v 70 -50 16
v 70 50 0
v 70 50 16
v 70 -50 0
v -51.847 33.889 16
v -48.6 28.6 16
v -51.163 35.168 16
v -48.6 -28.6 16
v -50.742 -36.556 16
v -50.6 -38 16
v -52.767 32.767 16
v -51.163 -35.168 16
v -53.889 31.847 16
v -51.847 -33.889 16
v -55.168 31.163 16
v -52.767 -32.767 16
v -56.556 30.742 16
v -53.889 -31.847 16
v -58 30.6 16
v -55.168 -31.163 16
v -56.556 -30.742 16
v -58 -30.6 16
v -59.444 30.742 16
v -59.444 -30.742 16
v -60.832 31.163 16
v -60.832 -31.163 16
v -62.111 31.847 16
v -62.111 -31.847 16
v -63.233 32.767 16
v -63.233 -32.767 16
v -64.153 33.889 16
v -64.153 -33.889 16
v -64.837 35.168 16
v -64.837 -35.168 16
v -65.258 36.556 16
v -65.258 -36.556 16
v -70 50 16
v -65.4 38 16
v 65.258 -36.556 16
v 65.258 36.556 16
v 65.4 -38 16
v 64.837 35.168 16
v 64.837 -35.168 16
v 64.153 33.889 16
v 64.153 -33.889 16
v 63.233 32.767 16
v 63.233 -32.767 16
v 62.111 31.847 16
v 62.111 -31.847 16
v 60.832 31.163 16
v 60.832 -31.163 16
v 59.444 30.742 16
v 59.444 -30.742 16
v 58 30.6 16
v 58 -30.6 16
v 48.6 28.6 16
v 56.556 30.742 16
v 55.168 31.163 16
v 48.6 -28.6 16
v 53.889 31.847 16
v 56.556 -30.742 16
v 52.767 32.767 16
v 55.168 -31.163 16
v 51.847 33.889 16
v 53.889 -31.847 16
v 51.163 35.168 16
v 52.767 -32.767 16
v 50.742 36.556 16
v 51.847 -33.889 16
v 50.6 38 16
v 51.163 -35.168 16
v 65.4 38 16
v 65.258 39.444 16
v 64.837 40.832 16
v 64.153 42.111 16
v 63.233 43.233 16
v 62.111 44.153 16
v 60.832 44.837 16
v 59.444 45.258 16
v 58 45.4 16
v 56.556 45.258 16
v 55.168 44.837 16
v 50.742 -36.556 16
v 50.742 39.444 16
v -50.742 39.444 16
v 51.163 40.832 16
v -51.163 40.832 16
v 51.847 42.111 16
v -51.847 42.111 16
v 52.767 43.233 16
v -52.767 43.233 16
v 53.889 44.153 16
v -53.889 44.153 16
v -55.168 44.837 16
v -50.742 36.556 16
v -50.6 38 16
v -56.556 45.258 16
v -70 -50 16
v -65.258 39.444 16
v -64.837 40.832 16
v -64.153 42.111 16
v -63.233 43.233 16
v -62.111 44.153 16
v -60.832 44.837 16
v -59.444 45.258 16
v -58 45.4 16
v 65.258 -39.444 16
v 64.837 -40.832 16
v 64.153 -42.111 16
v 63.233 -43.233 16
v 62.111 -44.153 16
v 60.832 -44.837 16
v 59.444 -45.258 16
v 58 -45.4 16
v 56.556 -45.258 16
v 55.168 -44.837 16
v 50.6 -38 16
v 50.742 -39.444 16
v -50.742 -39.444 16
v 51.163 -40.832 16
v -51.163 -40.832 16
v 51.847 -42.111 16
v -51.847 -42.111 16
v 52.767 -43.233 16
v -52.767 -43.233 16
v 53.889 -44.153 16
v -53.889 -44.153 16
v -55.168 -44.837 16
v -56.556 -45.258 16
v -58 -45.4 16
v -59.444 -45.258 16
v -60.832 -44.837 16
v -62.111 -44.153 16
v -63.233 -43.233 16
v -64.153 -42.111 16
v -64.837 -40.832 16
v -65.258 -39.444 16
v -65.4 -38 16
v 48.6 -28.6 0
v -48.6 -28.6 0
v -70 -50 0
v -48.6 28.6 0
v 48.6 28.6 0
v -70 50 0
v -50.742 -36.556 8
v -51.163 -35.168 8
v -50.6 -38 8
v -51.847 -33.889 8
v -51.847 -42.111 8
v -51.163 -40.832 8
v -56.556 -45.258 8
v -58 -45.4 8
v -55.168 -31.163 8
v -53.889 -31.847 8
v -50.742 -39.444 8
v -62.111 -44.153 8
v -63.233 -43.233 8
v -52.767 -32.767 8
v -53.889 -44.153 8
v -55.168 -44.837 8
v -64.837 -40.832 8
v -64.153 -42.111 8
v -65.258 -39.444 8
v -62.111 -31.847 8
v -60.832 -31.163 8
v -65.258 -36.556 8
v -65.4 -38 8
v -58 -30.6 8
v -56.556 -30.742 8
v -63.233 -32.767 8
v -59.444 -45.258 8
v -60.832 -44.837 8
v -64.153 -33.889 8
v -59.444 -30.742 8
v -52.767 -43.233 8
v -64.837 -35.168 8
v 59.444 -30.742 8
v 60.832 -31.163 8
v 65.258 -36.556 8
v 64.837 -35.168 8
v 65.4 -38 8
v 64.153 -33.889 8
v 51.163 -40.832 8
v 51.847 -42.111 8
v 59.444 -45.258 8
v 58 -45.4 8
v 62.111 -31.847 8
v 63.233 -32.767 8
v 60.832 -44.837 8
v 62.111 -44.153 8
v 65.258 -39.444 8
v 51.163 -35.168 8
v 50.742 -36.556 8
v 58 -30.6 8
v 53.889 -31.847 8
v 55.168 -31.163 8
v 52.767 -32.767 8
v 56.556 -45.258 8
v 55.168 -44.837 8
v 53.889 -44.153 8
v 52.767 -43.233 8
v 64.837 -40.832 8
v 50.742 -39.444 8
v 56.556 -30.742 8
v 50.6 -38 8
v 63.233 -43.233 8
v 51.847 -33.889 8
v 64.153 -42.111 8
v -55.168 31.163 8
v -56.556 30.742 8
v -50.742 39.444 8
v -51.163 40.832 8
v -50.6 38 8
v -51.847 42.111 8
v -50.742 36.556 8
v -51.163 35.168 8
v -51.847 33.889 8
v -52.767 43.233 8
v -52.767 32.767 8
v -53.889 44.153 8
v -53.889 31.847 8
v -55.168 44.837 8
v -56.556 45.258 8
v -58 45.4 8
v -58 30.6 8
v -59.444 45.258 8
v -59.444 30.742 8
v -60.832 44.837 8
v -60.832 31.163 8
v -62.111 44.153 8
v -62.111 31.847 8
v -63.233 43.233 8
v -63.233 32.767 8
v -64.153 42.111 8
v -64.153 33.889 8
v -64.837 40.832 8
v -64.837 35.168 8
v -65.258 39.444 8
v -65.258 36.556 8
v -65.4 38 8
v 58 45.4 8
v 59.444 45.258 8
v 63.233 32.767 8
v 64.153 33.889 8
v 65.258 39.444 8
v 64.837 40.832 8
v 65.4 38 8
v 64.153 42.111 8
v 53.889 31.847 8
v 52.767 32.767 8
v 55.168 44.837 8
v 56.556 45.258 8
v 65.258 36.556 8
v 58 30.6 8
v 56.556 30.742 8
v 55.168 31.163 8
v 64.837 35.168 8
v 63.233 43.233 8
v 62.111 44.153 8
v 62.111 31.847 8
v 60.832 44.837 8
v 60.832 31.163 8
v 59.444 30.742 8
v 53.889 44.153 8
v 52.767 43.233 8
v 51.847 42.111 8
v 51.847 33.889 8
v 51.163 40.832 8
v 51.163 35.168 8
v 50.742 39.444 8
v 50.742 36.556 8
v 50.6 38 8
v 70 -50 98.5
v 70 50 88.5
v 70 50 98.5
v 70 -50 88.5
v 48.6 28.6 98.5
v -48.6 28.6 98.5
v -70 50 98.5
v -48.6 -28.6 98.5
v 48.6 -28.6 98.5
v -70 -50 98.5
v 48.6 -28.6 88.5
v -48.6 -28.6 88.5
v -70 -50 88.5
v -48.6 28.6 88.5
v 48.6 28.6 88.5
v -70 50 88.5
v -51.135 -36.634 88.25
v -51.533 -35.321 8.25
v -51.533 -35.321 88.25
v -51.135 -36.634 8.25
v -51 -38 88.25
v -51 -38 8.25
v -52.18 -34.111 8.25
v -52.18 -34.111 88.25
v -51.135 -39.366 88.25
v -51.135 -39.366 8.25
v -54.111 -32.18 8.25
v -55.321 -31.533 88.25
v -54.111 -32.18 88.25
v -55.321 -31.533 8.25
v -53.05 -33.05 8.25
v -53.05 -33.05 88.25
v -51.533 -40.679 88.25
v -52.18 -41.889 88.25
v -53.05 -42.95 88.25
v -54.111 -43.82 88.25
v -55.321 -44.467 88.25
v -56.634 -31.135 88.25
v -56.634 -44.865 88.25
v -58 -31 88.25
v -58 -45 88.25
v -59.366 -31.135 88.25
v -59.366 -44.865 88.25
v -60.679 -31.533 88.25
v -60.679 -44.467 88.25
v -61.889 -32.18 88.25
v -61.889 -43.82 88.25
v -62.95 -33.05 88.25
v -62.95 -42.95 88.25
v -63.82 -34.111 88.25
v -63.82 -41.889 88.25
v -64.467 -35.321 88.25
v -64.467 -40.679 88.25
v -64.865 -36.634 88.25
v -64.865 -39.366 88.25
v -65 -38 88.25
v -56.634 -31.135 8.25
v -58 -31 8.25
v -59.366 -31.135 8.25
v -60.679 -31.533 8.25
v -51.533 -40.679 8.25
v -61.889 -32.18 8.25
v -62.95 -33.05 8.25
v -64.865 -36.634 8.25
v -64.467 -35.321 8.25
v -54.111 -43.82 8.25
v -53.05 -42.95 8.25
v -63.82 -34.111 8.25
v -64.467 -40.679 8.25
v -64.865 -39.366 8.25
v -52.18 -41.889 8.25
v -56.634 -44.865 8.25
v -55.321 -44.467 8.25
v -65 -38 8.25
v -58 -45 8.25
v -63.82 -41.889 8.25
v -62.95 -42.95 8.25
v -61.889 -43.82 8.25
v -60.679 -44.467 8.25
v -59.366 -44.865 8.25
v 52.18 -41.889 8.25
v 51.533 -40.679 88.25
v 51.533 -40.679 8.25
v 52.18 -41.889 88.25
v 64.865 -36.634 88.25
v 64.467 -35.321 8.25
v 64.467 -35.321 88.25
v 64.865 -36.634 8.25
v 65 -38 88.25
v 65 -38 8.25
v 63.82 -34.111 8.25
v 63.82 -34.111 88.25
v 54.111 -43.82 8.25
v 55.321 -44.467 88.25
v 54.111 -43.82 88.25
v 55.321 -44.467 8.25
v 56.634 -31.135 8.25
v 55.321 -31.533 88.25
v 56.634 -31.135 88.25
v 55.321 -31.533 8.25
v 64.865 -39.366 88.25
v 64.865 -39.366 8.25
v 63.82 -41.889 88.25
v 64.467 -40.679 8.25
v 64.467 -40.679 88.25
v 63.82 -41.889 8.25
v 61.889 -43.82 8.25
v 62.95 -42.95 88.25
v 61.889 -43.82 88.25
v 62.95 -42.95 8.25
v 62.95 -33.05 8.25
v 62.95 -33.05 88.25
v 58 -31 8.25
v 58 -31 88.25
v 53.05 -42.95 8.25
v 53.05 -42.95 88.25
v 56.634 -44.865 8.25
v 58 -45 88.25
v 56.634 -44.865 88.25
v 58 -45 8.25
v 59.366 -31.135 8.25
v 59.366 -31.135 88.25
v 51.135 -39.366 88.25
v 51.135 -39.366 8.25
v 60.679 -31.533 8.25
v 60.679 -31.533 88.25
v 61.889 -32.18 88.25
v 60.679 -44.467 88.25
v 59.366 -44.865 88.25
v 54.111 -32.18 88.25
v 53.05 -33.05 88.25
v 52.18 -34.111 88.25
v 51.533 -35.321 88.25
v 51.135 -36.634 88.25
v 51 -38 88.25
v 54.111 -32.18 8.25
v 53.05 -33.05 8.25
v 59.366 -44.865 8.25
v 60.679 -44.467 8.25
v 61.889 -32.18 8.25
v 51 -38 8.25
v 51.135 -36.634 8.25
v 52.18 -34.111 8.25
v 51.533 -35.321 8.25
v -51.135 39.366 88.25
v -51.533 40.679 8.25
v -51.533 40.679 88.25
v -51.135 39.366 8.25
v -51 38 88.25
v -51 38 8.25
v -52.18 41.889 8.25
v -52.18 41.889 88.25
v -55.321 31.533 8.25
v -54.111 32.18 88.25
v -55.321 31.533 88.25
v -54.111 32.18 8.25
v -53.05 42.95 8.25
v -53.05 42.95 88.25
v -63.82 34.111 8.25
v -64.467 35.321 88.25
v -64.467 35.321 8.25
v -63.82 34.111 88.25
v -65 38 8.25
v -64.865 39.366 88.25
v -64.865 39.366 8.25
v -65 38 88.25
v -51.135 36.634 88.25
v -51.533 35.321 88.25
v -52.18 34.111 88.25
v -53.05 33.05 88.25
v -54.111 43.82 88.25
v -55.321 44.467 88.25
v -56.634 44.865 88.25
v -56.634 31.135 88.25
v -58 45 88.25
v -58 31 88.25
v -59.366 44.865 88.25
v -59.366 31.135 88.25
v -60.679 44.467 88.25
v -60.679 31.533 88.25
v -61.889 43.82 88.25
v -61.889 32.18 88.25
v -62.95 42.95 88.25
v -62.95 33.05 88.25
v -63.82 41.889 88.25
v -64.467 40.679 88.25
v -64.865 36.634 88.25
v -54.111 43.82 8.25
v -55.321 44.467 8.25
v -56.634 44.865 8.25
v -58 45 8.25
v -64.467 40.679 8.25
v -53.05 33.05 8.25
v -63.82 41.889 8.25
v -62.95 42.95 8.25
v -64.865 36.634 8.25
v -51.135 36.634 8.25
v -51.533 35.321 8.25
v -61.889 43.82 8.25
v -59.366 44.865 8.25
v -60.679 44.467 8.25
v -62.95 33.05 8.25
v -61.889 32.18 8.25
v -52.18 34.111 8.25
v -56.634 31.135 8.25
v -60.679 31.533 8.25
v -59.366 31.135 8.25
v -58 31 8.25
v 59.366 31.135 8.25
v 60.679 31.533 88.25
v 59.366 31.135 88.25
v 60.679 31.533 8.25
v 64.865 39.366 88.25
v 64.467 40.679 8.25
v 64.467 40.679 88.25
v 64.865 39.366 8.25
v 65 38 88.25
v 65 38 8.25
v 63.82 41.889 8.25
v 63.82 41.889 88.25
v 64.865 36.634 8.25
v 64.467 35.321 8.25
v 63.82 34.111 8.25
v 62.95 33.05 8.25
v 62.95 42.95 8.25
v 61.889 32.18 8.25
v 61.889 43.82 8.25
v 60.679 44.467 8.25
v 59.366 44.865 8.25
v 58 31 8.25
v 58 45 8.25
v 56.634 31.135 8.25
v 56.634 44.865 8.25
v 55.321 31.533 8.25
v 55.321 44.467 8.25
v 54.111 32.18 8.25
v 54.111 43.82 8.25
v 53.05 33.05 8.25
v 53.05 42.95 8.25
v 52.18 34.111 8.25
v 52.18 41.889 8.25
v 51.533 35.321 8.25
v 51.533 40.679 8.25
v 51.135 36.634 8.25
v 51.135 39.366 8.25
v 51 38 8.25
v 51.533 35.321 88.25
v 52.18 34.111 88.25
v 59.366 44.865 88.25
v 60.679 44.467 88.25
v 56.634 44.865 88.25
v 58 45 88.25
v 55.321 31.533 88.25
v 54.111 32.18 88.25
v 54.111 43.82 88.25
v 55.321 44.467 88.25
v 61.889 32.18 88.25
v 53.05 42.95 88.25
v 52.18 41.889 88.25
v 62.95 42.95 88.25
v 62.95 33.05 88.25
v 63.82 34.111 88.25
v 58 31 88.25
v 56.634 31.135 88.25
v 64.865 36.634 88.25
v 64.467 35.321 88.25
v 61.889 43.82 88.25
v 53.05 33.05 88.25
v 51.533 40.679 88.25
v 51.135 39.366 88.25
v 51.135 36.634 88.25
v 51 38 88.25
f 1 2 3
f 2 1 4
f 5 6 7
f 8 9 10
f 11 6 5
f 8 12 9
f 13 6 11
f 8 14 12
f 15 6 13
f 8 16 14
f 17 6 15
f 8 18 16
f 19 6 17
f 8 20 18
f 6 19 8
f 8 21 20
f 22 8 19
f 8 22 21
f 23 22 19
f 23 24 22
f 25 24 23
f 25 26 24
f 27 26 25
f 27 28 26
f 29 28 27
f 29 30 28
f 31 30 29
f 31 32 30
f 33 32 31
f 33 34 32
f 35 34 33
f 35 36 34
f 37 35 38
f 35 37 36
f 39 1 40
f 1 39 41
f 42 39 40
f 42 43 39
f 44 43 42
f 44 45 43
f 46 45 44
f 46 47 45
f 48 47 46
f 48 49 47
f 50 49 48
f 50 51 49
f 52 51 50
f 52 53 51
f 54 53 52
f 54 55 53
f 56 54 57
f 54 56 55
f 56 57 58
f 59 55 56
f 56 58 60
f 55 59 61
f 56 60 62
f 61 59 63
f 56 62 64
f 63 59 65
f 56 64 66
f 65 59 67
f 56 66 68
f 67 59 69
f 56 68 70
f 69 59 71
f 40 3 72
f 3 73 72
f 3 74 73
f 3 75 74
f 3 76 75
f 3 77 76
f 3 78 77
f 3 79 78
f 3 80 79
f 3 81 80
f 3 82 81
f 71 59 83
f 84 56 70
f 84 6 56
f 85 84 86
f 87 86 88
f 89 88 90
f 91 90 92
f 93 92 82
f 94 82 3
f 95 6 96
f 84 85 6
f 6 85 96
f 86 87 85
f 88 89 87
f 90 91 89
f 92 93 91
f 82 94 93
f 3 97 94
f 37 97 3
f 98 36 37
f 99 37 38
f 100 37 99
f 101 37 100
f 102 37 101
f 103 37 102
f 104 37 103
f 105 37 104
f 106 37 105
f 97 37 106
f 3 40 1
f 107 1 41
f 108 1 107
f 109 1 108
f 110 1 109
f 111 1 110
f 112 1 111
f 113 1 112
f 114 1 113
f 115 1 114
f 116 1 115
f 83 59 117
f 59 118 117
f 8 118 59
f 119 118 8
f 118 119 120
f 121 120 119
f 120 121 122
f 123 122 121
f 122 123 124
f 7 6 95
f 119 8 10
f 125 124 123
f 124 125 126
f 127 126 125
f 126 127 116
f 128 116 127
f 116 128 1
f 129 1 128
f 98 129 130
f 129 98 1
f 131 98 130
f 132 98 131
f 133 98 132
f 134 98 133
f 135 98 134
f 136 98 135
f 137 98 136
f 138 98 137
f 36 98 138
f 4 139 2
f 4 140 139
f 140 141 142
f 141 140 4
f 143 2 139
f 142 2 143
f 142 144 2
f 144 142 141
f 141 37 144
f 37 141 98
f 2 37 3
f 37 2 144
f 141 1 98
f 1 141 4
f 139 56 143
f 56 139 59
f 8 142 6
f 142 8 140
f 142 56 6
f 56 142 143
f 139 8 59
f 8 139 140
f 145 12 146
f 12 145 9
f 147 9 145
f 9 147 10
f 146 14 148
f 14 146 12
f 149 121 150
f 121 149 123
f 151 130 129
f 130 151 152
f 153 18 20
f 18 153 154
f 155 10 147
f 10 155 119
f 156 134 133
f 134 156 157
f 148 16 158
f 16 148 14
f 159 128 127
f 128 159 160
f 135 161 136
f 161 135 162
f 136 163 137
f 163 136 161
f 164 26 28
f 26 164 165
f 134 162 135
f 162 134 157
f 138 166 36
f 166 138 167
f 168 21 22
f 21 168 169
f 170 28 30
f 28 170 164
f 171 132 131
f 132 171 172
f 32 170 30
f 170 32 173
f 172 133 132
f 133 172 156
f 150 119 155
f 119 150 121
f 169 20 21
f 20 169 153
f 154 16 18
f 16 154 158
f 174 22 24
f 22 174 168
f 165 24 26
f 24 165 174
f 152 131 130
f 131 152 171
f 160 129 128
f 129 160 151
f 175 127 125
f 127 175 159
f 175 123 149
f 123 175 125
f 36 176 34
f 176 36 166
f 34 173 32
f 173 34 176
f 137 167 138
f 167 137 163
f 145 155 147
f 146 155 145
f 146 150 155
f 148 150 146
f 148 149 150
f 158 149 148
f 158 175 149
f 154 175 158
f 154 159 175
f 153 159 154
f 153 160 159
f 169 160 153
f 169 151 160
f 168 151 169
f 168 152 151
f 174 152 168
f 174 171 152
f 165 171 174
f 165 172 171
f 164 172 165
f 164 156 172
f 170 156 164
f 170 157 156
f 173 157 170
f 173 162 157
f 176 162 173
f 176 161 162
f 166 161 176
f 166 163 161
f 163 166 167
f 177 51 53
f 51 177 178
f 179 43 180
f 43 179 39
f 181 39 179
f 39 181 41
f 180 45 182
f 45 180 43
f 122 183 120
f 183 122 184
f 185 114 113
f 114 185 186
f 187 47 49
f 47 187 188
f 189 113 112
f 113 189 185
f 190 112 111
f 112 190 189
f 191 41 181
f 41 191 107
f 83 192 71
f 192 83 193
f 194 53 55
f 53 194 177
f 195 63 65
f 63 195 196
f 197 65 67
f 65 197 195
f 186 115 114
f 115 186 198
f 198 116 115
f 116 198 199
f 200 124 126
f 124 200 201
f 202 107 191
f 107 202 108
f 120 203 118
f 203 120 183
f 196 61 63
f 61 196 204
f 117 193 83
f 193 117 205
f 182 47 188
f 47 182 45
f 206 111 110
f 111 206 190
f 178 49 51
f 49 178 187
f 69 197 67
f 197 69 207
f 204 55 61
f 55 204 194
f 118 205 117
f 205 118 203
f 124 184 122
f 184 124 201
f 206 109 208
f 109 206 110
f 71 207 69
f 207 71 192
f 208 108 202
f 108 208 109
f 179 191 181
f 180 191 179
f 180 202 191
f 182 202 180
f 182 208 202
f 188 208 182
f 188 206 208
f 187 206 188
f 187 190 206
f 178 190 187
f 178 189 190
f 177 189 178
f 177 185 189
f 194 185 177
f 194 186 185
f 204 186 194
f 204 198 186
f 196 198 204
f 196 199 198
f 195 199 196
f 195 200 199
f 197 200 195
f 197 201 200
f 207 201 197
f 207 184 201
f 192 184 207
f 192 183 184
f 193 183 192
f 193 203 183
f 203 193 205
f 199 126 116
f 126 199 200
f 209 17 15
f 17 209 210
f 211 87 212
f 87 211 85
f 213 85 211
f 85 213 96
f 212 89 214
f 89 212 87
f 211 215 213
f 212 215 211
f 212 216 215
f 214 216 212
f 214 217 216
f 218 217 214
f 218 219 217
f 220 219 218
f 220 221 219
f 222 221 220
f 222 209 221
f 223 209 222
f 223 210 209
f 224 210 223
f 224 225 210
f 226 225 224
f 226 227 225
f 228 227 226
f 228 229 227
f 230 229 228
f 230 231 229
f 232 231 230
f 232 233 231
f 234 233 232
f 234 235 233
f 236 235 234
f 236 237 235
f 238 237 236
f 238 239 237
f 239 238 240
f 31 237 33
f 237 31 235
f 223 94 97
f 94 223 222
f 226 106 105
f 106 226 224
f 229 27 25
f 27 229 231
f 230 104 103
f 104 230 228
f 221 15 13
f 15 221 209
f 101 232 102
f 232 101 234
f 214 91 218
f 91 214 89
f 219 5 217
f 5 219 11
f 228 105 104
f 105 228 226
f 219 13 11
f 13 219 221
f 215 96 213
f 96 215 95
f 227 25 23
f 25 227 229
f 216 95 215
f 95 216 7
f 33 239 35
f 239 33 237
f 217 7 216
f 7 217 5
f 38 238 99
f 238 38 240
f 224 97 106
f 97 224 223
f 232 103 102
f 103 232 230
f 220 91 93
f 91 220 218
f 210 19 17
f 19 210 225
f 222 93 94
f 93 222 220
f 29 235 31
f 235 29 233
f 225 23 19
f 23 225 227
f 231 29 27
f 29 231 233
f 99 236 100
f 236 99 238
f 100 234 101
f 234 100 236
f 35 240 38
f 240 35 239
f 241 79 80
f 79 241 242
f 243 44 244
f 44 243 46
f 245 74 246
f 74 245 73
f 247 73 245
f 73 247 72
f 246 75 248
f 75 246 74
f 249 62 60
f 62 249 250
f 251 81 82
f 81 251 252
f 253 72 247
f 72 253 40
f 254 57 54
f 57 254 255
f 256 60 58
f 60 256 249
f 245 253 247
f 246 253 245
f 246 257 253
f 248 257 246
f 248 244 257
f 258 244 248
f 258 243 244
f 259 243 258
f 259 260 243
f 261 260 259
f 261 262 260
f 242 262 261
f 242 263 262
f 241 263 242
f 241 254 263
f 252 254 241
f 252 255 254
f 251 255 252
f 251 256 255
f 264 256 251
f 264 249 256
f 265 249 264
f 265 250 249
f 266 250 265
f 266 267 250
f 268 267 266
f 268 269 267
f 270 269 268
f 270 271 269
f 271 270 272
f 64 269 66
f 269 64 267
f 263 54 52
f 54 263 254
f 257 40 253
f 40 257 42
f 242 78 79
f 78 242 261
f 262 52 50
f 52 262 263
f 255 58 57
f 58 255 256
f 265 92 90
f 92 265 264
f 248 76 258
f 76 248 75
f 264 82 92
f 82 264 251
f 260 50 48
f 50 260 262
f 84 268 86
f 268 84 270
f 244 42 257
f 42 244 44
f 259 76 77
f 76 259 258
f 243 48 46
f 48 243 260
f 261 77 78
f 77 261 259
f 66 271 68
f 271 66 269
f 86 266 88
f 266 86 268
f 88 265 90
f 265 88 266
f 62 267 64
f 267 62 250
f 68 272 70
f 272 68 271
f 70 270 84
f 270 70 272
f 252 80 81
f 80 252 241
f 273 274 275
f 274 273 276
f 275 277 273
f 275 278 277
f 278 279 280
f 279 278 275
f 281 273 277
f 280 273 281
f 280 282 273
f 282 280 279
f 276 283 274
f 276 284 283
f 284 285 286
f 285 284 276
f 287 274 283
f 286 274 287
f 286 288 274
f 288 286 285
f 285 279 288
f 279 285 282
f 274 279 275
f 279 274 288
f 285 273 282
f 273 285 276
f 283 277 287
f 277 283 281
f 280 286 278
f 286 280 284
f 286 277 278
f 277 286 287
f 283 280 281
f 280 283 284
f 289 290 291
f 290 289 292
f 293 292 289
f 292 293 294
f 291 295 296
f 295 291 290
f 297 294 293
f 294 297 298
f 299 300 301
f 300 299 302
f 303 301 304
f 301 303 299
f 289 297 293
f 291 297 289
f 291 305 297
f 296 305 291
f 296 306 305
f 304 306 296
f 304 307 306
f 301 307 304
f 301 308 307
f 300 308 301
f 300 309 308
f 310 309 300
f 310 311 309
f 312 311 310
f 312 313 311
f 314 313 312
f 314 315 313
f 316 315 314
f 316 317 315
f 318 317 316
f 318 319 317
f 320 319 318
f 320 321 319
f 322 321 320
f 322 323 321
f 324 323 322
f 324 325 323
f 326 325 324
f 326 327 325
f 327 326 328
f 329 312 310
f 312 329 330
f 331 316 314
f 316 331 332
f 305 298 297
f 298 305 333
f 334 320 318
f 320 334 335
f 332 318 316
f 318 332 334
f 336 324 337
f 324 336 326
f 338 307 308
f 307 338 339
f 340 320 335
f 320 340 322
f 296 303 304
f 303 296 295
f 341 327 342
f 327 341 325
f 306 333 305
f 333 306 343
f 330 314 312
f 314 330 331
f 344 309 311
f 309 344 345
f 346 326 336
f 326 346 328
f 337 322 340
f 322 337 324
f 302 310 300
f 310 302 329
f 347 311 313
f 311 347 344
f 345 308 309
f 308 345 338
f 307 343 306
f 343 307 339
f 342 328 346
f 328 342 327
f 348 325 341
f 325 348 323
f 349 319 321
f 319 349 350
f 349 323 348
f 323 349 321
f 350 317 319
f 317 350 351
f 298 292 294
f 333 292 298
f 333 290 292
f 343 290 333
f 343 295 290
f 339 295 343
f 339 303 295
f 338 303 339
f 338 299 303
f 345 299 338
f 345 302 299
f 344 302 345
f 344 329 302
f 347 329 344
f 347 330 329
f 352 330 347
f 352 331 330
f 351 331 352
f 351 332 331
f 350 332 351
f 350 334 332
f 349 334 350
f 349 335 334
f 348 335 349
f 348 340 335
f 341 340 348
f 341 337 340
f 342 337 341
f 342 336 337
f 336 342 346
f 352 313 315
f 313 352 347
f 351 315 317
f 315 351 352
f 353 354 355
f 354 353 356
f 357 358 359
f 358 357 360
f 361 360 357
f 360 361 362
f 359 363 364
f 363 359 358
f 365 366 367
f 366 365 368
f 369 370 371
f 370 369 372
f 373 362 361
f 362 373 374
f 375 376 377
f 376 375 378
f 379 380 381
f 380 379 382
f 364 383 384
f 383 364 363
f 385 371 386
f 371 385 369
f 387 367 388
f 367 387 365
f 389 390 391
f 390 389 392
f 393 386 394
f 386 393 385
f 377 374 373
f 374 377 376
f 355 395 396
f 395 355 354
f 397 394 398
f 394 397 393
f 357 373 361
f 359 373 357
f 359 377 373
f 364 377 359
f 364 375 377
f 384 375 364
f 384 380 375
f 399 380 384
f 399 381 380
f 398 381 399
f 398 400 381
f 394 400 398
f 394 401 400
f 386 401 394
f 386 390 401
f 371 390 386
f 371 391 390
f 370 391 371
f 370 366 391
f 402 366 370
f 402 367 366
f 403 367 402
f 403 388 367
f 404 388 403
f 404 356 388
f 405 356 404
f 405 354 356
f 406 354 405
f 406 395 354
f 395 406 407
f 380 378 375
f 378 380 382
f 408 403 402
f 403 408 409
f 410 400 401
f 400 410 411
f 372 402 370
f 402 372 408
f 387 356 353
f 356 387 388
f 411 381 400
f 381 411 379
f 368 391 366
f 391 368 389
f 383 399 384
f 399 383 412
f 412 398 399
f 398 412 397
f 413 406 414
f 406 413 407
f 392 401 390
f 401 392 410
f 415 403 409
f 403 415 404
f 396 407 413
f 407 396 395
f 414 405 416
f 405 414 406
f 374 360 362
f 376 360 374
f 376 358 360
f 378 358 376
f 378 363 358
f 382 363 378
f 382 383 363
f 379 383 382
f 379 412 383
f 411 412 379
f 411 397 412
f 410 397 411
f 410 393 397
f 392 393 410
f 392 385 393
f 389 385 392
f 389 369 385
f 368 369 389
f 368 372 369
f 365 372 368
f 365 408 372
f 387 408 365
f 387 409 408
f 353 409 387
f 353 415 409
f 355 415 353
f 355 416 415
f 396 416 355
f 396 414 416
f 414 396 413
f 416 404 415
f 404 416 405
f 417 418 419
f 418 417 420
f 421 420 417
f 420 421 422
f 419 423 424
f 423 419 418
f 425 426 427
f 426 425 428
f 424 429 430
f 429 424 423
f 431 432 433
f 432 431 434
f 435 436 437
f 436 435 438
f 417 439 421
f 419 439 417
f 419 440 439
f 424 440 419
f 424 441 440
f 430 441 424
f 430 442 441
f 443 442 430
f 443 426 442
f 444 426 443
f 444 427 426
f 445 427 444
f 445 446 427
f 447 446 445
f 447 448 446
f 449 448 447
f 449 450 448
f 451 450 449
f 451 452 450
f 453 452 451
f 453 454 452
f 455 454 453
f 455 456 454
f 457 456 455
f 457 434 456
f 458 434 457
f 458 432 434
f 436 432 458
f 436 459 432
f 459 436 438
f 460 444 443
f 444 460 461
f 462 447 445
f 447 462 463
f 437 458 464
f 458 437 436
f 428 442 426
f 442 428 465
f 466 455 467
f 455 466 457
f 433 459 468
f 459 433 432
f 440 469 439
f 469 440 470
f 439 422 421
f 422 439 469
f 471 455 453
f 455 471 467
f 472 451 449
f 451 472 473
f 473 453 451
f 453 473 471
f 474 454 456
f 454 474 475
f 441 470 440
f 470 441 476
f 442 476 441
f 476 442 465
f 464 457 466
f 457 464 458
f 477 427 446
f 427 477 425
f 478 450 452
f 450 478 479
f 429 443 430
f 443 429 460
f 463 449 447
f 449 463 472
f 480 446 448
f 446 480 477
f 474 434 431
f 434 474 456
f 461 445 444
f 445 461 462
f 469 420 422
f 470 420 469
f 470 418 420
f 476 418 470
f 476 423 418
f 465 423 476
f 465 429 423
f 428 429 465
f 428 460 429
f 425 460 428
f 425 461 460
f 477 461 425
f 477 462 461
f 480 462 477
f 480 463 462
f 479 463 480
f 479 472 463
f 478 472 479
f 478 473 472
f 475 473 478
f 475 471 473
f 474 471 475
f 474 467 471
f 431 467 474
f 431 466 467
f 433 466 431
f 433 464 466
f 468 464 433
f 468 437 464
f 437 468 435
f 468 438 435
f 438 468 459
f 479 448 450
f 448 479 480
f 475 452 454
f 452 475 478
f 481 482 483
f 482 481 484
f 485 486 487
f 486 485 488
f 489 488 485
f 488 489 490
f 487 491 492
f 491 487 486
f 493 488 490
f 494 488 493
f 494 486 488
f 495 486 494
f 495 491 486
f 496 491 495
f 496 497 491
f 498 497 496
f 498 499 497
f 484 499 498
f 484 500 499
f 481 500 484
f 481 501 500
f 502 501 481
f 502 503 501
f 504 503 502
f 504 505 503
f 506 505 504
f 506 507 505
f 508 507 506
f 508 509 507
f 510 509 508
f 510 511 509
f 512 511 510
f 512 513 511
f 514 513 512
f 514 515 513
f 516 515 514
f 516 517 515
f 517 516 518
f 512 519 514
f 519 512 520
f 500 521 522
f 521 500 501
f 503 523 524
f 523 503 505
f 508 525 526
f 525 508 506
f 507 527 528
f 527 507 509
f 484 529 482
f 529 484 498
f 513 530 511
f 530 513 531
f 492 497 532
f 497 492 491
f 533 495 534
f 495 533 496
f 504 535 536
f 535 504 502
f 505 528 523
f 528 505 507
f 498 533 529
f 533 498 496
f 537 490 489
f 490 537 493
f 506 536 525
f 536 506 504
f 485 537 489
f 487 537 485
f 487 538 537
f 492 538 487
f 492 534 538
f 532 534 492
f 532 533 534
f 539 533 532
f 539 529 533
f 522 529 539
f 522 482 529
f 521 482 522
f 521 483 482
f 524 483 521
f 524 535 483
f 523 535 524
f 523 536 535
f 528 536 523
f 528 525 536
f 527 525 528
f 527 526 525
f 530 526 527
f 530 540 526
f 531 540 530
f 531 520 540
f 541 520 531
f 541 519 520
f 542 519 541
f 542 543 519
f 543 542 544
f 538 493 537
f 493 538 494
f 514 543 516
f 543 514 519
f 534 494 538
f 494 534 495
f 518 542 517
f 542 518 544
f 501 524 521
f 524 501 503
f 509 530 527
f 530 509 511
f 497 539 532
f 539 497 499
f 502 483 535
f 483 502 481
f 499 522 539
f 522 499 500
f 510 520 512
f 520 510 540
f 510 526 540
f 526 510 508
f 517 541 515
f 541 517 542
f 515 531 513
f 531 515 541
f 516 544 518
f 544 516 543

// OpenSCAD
$fn = 32;

// ------------------------------------------------------------------------
// Frame cube: base 140 x 100 mm, posts 80 mm tall
// Every part is its own module, assembly() places every instance.
// ------------------------------------------------------------------------

// --- part 1 ---
module base_frame() {
  difference() {
    translate([-70, -50, 0]) cube([140, 100, 16]);
    translate([-48.6, -28.6, -1]) cube([97.2, 57.2, 18]);
    translate([-58, -38, 8]) cylinder(h = 9, d = 14.8);
    translate([58, -38, 8]) cylinder(h = 9, d = 14.8);
    translate([-58, 38, 8]) cylinder(h = 9, d = 14.8);
    translate([58, 38, 8]) cylinder(h = 9, d = 14.8);
  }
}

// --- part 2 ---
module corner_post() {
  cylinder(h = 80, d = 14);
}

// --- part 3 ---
module top_frame() {
  difference() {
    translate([-70, -50, 0]) cube([140, 100, 10]);
    translate([-48.6, -28.6, -1]) cube([97.2, 57.2, 12]);
  }
}

// --- assembly ---
module assembly() {
  color([0.80, 0.24, 0.20]) translate([0, 0, 0]) rotate([0, 0, 0]) base_frame();
  color([0.20, 0.45, 0.75]) translate([-58, -38, 8.25]) rotate([0, 0, 0]) corner_post();
  color([0.25, 0.62, 0.32]) translate([58, -38, 8.25]) rotate([0, 0, 0]) corner_post();
  color([0.92, 0.70, 0.18]) translate([-58, 38, 8.25]) rotate([0, 0, 0]) corner_post();
  color([0.58, 0.35, 0.70]) translate([58, 38, 8.25]) rotate([0, 0, 0]) corner_post();
  color([0.16, 0.66, 0.66]) translate([0, 0, 88.5]) rotate([0, 0, 0]) top_frame();
}

assembly();
